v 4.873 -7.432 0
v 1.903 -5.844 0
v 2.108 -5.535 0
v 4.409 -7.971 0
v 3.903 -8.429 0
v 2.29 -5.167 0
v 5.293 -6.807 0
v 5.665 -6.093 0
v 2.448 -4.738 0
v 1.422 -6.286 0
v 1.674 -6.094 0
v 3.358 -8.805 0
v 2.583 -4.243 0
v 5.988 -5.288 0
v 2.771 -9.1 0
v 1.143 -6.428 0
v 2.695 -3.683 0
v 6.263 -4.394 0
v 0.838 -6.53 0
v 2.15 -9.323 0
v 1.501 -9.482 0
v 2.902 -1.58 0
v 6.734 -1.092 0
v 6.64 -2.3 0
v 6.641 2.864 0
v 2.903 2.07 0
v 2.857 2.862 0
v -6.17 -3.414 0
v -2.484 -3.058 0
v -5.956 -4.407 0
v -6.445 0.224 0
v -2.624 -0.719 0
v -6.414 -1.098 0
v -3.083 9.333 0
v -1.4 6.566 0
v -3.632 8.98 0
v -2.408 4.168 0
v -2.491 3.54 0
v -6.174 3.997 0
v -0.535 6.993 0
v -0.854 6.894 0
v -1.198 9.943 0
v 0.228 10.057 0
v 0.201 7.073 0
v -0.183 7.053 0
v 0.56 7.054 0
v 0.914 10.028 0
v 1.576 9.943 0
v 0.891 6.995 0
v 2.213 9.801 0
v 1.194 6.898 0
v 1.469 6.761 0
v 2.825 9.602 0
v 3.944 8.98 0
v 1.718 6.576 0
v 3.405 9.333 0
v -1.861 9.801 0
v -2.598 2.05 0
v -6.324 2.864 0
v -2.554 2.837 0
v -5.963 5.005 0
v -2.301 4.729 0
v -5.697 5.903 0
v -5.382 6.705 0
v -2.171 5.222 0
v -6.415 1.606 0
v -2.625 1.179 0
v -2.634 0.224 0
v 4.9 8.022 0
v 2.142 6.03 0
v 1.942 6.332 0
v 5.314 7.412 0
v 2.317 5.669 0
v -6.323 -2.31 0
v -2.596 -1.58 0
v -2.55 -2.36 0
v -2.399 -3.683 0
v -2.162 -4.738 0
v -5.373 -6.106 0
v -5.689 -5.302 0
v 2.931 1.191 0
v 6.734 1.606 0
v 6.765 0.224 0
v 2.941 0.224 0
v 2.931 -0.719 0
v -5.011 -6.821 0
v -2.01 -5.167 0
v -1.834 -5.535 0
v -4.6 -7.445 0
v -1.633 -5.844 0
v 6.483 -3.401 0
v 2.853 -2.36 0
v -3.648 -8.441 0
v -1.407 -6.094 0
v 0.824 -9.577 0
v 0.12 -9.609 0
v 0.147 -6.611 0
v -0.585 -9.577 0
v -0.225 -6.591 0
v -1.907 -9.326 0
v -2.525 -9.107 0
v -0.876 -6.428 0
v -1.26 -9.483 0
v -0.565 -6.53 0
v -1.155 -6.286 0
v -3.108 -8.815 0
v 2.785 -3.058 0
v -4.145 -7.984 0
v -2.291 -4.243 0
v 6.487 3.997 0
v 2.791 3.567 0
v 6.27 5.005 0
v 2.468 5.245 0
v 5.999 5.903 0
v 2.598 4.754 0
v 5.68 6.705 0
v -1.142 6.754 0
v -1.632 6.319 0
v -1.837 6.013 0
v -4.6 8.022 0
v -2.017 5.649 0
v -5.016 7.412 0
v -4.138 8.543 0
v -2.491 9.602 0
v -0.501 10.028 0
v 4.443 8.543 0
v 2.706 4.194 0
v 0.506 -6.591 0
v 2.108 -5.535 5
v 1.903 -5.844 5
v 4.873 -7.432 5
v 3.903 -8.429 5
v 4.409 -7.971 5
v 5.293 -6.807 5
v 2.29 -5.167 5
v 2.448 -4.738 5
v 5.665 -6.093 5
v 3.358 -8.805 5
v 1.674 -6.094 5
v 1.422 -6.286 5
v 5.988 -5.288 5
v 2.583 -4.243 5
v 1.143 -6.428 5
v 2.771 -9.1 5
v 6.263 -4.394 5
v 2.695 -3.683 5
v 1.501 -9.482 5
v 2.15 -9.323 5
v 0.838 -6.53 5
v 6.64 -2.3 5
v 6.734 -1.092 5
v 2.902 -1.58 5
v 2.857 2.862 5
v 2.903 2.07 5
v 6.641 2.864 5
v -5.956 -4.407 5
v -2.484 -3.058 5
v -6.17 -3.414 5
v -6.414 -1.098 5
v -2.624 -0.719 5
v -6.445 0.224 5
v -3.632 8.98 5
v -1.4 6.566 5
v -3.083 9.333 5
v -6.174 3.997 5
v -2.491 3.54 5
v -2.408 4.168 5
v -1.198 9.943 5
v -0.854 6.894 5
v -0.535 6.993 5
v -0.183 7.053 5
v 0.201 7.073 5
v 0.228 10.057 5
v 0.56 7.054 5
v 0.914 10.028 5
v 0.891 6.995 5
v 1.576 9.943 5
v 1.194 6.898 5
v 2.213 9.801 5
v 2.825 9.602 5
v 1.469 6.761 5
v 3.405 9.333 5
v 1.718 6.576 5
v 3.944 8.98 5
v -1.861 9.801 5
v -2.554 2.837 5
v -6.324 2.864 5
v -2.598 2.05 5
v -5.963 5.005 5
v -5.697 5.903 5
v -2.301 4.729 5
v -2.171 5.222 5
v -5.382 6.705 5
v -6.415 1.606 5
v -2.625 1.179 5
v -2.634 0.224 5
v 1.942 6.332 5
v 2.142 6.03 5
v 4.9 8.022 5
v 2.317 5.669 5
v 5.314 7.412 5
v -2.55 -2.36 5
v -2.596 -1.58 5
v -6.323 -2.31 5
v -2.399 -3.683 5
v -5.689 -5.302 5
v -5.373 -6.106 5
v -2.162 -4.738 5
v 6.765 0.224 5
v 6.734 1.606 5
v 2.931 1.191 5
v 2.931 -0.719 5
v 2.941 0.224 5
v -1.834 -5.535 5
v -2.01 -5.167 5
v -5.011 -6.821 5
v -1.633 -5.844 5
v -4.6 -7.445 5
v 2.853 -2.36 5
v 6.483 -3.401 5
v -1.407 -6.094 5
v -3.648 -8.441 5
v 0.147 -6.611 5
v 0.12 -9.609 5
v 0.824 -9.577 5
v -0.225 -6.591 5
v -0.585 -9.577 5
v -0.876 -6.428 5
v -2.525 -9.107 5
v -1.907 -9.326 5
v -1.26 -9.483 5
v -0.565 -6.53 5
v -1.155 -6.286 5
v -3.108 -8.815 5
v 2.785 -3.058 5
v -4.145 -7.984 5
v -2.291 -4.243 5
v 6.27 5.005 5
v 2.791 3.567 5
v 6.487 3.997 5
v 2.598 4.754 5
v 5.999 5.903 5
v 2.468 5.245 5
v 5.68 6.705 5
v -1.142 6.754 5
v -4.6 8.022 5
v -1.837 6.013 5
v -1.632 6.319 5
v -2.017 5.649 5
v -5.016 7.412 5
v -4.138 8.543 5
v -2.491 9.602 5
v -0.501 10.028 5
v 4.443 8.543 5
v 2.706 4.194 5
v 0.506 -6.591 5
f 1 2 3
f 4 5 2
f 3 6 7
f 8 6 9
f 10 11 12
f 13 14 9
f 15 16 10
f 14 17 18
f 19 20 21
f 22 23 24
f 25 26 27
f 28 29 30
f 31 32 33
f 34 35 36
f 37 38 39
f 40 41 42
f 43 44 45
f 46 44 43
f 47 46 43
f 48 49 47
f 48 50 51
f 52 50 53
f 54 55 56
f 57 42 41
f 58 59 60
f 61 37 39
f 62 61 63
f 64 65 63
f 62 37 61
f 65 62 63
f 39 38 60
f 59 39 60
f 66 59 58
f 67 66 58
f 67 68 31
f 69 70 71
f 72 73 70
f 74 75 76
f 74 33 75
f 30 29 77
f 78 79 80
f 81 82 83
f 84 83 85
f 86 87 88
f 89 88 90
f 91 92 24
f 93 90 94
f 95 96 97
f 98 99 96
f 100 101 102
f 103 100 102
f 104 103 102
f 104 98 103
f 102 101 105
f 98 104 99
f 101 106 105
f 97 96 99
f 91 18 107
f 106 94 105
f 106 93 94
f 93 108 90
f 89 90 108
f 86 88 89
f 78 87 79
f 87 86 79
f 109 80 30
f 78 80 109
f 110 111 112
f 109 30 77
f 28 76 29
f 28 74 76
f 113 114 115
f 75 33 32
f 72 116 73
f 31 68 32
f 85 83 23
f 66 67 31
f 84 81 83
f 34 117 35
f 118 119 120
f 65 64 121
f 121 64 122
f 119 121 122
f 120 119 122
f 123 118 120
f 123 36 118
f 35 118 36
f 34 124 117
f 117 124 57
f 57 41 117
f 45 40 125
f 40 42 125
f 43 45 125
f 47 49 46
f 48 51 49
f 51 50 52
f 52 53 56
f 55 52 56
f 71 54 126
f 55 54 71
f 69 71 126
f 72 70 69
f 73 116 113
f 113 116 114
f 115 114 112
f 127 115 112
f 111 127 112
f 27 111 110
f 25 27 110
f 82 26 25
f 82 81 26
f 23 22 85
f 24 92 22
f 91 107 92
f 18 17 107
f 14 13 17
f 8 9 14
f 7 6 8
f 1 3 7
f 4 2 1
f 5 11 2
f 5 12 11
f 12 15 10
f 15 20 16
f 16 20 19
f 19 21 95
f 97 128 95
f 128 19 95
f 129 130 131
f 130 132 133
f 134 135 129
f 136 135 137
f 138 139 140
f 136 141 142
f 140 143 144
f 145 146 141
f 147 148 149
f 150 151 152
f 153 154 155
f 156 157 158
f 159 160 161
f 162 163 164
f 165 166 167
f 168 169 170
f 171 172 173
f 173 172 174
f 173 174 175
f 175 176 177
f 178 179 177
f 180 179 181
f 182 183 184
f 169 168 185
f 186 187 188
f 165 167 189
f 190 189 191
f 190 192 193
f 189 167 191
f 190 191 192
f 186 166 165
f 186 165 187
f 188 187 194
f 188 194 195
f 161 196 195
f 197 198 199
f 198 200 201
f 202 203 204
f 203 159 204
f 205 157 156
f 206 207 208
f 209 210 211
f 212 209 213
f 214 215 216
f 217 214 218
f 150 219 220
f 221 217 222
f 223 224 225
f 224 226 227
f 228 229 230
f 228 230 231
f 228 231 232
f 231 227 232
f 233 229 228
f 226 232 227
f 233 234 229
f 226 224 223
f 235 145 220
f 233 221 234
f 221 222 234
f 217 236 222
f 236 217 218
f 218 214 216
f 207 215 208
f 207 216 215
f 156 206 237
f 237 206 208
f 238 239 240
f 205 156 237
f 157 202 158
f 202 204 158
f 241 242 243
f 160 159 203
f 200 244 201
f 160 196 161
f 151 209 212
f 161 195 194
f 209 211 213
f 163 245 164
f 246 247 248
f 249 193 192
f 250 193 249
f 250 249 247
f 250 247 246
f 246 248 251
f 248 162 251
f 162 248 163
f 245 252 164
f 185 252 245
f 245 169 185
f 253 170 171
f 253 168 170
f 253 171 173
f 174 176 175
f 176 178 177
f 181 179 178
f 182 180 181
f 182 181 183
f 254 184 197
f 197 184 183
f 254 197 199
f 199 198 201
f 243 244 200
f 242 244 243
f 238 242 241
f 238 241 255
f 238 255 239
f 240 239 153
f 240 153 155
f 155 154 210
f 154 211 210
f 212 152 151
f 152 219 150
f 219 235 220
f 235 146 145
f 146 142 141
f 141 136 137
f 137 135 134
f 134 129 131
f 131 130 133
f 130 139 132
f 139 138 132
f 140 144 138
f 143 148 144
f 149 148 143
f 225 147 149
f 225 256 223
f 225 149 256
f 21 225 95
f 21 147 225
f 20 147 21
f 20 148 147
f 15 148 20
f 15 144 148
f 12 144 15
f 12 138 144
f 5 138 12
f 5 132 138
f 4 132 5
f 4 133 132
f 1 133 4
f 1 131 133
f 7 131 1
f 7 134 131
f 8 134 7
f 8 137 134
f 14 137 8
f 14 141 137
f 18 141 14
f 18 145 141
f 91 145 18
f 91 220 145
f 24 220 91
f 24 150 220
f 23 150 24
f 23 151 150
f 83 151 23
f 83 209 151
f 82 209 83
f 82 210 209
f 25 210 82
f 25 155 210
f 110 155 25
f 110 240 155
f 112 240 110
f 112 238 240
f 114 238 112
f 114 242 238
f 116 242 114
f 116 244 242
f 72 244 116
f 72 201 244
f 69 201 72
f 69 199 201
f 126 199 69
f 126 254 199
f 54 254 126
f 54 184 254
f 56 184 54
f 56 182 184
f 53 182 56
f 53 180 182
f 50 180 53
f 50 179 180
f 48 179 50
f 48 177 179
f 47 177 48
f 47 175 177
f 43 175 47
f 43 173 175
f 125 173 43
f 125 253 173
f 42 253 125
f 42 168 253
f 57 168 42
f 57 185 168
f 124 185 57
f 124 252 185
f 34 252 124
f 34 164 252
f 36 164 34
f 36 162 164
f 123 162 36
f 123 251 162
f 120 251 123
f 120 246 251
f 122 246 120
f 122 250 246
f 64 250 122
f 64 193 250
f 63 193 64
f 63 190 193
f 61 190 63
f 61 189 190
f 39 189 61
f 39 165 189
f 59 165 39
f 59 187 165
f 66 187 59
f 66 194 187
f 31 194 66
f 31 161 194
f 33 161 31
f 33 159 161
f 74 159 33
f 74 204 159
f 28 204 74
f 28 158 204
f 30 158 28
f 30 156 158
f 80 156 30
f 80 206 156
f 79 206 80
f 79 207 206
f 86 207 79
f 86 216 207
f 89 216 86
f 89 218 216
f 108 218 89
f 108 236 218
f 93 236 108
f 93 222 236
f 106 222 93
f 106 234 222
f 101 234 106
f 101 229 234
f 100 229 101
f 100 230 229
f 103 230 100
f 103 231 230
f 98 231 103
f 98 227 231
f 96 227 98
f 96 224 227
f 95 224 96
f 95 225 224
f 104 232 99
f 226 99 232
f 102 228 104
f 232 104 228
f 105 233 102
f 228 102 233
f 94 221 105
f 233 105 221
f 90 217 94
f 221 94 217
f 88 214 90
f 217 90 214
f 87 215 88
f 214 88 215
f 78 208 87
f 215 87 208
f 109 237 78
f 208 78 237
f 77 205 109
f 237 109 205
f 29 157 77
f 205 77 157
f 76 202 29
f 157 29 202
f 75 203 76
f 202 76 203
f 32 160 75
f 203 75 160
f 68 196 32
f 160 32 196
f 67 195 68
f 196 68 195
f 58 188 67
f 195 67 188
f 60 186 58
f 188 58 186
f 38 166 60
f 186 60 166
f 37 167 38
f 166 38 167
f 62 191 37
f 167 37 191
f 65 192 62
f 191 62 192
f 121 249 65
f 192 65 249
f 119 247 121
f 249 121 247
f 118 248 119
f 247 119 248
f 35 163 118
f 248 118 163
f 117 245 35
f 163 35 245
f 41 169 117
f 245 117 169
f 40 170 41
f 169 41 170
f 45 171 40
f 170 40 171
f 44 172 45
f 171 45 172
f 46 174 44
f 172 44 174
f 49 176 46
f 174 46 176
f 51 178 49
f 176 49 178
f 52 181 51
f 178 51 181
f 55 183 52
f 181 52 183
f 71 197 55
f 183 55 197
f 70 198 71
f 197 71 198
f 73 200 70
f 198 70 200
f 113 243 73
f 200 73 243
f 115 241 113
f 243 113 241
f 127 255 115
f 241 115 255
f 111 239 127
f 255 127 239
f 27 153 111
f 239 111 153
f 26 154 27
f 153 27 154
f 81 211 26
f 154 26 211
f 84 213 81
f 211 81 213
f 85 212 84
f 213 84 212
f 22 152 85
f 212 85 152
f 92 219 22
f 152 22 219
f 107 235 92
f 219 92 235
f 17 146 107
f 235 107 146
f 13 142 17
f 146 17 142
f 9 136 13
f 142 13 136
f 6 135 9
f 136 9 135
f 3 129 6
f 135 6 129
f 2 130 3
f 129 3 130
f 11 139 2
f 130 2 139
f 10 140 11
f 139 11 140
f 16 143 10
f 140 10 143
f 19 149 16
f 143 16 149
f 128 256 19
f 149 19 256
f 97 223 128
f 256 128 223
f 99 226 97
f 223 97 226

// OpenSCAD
// Parameters
number_text = "IPB";     // Change this to any number or text
font_size = 15;        // Size of the text
thickness = 5;         // Extrusion height

// Parameters
number_text = "0";     // Change this to any number or text
font_size = 20;        // Size of the text
thickness = 5;         // Extrusion height

// 3D text
linear_extrude(height = thickness)
    text(number_text,
         size = font_size,
         font = "Liberation Sans:style=Bold",
         halign = "center",
         valign = "center");
